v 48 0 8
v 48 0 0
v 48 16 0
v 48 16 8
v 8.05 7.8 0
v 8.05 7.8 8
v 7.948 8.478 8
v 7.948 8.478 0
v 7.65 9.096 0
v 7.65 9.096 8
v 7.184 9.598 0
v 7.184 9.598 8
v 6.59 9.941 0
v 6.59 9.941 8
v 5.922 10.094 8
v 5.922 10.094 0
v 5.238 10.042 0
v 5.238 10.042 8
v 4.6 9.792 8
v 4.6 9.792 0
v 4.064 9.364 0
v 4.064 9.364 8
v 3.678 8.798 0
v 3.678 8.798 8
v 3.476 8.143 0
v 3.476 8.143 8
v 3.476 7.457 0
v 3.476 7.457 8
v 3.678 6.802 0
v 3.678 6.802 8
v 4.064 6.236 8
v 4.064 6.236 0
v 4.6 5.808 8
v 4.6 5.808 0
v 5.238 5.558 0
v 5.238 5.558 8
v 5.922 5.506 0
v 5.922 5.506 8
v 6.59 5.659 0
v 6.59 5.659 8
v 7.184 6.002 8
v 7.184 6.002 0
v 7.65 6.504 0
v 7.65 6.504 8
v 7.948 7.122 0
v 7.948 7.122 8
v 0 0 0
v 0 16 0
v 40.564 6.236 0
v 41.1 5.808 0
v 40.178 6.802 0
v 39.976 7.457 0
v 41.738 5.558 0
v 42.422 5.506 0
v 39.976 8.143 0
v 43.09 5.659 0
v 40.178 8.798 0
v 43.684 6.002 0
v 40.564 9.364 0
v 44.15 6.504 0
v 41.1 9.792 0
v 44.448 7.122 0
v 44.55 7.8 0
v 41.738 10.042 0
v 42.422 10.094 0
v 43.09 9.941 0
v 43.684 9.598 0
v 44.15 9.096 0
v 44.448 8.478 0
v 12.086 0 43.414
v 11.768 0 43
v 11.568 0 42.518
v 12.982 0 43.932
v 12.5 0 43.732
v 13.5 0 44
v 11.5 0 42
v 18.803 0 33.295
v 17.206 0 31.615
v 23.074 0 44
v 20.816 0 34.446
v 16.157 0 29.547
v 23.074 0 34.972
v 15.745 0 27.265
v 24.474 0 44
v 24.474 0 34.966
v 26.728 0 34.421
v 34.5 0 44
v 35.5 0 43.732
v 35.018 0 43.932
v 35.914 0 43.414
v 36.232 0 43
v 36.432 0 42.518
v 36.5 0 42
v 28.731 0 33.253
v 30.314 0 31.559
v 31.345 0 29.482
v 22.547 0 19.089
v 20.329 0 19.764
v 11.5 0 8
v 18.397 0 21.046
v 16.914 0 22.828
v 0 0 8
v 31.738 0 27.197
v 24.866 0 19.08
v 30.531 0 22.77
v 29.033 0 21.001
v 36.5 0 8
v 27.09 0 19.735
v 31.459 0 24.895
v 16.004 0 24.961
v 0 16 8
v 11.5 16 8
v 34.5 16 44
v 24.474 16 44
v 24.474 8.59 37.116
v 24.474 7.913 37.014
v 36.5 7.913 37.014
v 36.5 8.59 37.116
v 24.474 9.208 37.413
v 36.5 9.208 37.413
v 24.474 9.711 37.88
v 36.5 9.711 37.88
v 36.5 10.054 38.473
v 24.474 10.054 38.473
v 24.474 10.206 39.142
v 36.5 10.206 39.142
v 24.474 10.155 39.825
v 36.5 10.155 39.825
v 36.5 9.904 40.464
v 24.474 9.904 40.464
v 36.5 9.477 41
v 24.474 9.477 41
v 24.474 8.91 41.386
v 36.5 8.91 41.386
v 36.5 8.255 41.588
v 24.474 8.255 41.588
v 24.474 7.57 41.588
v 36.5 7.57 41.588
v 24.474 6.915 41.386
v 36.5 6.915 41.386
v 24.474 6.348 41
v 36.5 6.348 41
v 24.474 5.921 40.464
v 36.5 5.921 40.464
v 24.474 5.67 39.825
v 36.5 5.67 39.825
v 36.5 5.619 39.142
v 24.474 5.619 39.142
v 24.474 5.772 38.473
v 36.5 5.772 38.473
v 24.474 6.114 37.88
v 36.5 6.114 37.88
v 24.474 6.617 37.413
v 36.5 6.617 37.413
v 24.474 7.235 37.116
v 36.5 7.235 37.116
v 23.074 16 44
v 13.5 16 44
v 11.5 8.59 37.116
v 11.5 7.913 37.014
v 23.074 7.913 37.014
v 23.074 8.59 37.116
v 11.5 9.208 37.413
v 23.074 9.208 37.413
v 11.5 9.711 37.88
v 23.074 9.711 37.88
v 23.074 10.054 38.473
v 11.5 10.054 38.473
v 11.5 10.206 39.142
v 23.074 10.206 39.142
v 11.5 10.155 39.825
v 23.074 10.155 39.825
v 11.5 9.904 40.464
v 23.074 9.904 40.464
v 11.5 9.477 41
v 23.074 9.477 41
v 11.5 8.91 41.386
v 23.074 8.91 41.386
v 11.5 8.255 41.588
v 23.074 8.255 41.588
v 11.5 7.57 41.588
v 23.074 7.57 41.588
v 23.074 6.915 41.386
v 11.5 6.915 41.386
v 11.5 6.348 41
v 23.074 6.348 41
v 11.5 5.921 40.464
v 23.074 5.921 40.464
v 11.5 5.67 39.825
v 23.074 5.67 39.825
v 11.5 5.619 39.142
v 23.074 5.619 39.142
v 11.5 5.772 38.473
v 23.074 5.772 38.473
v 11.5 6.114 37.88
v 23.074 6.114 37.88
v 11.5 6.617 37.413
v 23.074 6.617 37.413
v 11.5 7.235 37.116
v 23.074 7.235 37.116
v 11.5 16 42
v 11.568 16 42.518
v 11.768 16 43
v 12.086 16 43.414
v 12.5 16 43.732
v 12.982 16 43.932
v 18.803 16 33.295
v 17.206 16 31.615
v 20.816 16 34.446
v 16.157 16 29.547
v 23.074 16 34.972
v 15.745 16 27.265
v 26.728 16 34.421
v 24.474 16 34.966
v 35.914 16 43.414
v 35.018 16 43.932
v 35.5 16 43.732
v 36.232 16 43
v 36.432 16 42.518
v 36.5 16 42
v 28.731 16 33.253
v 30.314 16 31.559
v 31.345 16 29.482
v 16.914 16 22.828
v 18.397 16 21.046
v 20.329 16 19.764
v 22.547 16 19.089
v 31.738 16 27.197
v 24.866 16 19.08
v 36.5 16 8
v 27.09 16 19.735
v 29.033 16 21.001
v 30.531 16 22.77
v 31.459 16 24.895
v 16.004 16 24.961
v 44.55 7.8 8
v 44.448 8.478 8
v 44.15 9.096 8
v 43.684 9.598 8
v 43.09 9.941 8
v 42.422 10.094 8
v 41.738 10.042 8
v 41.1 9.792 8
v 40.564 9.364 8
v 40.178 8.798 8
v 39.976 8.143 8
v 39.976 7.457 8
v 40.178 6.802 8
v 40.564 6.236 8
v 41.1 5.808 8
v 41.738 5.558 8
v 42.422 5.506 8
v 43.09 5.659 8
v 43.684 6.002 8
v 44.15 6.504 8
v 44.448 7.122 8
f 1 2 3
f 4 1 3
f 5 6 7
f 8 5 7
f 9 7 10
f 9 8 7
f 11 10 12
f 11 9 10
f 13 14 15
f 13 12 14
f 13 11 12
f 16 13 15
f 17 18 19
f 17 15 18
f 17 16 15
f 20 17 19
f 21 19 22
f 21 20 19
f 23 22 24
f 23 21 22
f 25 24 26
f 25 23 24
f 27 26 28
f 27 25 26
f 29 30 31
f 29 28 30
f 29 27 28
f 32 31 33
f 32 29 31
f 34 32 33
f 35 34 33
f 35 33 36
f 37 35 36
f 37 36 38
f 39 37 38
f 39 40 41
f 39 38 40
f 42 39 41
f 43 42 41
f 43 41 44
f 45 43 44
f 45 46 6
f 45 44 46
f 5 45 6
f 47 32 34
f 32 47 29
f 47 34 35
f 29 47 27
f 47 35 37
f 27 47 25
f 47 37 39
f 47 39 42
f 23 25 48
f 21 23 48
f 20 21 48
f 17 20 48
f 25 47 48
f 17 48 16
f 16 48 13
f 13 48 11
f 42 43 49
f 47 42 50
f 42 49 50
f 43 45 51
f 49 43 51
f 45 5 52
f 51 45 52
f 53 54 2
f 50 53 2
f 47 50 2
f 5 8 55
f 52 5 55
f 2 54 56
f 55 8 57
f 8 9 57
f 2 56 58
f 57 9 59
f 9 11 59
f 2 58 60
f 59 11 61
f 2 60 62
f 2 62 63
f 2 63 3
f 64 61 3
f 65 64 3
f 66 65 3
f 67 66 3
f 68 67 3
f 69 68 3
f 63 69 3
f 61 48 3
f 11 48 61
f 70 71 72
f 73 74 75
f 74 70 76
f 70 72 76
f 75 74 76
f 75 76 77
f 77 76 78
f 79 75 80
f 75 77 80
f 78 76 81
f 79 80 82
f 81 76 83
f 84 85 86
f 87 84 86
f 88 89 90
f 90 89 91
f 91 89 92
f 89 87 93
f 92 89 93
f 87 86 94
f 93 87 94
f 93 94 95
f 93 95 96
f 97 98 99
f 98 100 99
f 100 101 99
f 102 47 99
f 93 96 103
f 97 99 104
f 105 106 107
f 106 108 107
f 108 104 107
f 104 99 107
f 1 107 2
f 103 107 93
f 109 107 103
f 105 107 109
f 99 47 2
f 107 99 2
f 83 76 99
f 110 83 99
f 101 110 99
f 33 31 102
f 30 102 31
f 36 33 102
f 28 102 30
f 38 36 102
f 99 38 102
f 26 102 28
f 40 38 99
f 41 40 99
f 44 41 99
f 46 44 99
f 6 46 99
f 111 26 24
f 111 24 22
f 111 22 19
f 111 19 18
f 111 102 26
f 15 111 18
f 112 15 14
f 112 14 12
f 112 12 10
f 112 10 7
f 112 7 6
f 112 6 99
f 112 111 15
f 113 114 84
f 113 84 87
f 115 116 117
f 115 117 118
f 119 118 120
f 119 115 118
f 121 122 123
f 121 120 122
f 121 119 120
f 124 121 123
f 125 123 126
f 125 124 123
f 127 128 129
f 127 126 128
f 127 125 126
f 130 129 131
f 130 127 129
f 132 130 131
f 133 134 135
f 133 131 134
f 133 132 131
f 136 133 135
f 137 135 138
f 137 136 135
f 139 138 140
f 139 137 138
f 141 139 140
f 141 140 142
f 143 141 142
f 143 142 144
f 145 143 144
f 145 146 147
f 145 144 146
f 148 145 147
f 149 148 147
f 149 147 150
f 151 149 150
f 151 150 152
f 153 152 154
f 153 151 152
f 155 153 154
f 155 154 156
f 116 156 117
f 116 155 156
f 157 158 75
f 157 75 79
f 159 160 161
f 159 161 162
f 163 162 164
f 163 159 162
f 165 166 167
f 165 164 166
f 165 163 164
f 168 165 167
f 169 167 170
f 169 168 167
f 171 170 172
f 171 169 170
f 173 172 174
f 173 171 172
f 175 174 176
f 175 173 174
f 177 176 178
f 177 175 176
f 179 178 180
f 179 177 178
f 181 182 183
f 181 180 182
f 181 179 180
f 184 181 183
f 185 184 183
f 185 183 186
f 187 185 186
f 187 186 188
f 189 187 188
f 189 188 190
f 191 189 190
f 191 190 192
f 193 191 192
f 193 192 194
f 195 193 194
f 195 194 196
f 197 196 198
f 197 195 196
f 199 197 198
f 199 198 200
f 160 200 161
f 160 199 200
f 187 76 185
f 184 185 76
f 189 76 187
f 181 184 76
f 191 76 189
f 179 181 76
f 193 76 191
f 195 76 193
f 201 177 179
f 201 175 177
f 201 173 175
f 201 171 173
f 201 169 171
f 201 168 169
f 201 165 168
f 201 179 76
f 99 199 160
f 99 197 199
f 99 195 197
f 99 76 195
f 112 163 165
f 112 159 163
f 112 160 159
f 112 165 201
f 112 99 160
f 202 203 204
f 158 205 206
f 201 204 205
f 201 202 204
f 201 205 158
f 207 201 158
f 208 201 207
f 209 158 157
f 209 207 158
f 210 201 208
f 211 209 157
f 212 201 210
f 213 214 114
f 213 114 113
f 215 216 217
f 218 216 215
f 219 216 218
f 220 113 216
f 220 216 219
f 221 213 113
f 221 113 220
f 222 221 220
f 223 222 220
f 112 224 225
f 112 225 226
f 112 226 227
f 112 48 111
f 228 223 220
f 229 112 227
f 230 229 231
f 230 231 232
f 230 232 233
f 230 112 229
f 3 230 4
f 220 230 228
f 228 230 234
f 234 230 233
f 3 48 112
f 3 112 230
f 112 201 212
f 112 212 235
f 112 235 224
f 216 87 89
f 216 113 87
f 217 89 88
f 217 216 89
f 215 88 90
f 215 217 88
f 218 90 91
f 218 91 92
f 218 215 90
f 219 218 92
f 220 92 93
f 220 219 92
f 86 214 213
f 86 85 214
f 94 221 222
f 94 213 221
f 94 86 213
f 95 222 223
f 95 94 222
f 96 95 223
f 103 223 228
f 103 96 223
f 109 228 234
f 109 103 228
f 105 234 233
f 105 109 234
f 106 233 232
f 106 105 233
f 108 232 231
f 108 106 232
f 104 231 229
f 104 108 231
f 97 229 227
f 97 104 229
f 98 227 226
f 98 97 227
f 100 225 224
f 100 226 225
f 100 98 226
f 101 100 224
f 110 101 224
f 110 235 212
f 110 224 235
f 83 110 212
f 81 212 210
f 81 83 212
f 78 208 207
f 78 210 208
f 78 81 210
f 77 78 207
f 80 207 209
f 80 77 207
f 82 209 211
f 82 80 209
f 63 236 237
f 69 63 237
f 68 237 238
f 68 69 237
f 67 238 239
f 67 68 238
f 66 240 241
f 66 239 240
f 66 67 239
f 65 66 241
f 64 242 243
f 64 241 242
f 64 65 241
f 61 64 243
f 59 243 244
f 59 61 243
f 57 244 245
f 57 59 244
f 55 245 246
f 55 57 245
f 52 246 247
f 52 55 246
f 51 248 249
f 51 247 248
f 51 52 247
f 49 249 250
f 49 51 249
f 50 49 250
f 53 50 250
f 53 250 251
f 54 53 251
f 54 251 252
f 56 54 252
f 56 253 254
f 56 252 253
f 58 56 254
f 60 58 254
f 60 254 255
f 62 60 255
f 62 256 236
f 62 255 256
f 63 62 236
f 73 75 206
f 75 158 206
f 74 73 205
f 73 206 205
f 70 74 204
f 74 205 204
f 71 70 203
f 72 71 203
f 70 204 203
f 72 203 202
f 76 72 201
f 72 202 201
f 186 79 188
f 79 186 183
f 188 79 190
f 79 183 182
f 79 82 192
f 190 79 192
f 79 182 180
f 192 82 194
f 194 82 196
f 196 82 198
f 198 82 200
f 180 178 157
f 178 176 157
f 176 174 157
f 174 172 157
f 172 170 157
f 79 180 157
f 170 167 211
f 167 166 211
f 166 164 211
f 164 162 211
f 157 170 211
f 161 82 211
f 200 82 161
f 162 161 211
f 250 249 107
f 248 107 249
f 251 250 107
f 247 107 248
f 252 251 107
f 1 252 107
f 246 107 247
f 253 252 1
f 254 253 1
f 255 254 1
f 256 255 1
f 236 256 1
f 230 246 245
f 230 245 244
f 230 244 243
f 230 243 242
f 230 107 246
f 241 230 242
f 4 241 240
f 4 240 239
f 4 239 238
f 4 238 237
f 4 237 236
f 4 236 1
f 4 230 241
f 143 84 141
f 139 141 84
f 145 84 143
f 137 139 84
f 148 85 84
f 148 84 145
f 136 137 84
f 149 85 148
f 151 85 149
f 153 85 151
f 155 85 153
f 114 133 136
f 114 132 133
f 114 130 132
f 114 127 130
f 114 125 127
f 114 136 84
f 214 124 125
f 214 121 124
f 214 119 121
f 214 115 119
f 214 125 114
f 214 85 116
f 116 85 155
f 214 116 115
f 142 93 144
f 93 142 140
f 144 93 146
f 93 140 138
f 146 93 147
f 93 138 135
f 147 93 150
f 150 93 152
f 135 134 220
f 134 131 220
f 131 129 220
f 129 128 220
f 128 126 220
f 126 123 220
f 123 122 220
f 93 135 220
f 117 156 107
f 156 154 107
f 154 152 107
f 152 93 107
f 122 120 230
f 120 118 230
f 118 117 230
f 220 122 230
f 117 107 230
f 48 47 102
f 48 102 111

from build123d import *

# Parameters (mm, degrees)
CYLINDER003_R               = 2.3
CYLINDER003_DEPTH           = 40
CYLINDER003_PITCH_ANGLE     = 90
CYLINDER003_PLACEMENT_ANGLE = 7e-06
CYLINDER002_R               = 2.3
CYLINDER002_DEPTH           = 10
CYLINDER001_R               = 2.3
CYLINDER001_DEPTH           = 10
BOX002_W                    = 1.4
BOX002_H                    = 20
BOX002_DEPTH                = 20
CYLINDER_R                  = 8
CYLINDER_DEPTH              = 30
CYLINDER_ROLL_ANGLE         = -90
BOX001_W                    = 25
BOX001_H                    = 16
BOX001_DEPTH                = 36
BOX_W                       = 48
BOX_H                       = 16
BOX_DEPTH                   = 8
FILLET_R                    = 2
FILLET001_R                 = 2


with BuildPart() as cylinder003:
    # Cylinder003 → Cylinder003 (new body)
    with BuildSketch(Plane.XY):
        Circle(CYLINDER003_R)
    extrude(amount=CYLINDER003_DEPTH)


with BuildPart() as cylinder003_1:
    # Cylinder003 pitch: moved
    add(cylinder003.part.rotate(Axis((0, 0, 0), (0, 1, 0)), CYLINDER003_PITCH_ANGLE))


with BuildPart() as cylinder003_2:
    # Cylinder003 placement: moved
    add(cylinder003_1.part.moved(Location((3.687557, 7.912557, 39.313553))).rotate(Axis((3.687557, 7.912557, 39.313553), (0, 0, 1)), CYLINDER003_PLACEMENT_ANGLE))


with BuildPart() as cylinder002:
    # Cylinder002 → Cylinder002 (new body)
    with BuildSketch(Plane(origin=(42.25, 7.8, -0.597231), x_dir=(1, 0, 0), z_dir=(0, 0, 1))):
        Circle(CYLINDER002_R)
    extrude(amount=CYLINDER002_DEPTH)


with BuildPart() as cylinder001:
    # Cylinder001 → Cylinder001 (new body)
    with BuildSketch(Plane(origin=(5.75, 7.8, -0.597231), x_dir=(1, 0, 0), z_dir=(0, 0, 1))):
        Circle(CYLINDER001_R)
    extrude(amount=CYLINDER001_DEPTH)


with BuildPart() as box002:
    # Box002 → Box002 (new body)
    with BuildSketch(Plane(origin=(23.074221, -2.91866, 34.283958), x_dir=(1, 0, 0), z_dir=(0, 0, 1))):
        with Locations((0.7, 10)):
            Rectangle(BOX002_W, BOX002_H)
    extrude(amount=BOX002_DEPTH)


with BuildPart() as cylinder:
    # Cylinder → Cylinder (new body)
    with BuildSketch(Plane.XY):
        Circle(CYLINDER_R)
    extrude(amount=CYLINDER_DEPTH)


with BuildPart() as cylinder_1:
    # Cylinder roll: moved
    add(cylinder.part.rotate(Axis((0, 0, 0), (1, 0, 0)), CYLINDER_ROLL_ANGLE))


with BuildPart() as cylinder_2:
    # Cylinder placement: moved
    add(cylinder_1.part.moved(Location((23.7403, -8.80917, 27))))


with BuildPart() as box001:
    # Box001 → Box001 (new body)
    with BuildSketch(Plane(origin=(11.5, 0, 8), x_dir=(1, 0, 0), z_dir=(0, 0, 1))):
        with Locations((12.5, 8)):
            Rectangle(BOX001_W, BOX001_H)
    extrude(amount=BOX001_DEPTH)


with BuildPart() as fillet001:
    # Box → Box (new body)
    with BuildSketch(Plane.XY):
        with Locations((24, 8)):
            Rectangle(BOX_W, BOX_H)
    extrude(amount=BOX_DEPTH)

    # Fusion: union Box001
    add(box001.part)

    # Cut: cut Cylinder
    add(cylinder_2.part, mode=Mode.SUBTRACT)

    # Cut001: cut Box002
    add(box002.part, mode=Mode.SUBTRACT)

    # Cut002: cut Cylinder001
    add(cylinder001.part, mode=Mode.SUBTRACT)

    # Cut003: cut Cylinder002
    add(cylinder002.part, mode=Mode.SUBTRACT)

    # Cut004: cut Cylinder003
    add(cylinder003_2.part, mode=Mode.SUBTRACT)

    # Fillet
    fillet_edges = [fillet001.edges().sort_by_distance(p)[0] for p in [
        (36.5, 8, 44),
    ]]
    fillet(fillet_edges, radius=FILLET_R)

    # Fillet001
    fillet001_edges = [fillet001.edges().sort_by_distance(p)[0] for p in [
        (11.5, 8, 44),
    ]]
    fillet(fillet001_edges, radius=FILLET001_R)


solid = fillet001.part
